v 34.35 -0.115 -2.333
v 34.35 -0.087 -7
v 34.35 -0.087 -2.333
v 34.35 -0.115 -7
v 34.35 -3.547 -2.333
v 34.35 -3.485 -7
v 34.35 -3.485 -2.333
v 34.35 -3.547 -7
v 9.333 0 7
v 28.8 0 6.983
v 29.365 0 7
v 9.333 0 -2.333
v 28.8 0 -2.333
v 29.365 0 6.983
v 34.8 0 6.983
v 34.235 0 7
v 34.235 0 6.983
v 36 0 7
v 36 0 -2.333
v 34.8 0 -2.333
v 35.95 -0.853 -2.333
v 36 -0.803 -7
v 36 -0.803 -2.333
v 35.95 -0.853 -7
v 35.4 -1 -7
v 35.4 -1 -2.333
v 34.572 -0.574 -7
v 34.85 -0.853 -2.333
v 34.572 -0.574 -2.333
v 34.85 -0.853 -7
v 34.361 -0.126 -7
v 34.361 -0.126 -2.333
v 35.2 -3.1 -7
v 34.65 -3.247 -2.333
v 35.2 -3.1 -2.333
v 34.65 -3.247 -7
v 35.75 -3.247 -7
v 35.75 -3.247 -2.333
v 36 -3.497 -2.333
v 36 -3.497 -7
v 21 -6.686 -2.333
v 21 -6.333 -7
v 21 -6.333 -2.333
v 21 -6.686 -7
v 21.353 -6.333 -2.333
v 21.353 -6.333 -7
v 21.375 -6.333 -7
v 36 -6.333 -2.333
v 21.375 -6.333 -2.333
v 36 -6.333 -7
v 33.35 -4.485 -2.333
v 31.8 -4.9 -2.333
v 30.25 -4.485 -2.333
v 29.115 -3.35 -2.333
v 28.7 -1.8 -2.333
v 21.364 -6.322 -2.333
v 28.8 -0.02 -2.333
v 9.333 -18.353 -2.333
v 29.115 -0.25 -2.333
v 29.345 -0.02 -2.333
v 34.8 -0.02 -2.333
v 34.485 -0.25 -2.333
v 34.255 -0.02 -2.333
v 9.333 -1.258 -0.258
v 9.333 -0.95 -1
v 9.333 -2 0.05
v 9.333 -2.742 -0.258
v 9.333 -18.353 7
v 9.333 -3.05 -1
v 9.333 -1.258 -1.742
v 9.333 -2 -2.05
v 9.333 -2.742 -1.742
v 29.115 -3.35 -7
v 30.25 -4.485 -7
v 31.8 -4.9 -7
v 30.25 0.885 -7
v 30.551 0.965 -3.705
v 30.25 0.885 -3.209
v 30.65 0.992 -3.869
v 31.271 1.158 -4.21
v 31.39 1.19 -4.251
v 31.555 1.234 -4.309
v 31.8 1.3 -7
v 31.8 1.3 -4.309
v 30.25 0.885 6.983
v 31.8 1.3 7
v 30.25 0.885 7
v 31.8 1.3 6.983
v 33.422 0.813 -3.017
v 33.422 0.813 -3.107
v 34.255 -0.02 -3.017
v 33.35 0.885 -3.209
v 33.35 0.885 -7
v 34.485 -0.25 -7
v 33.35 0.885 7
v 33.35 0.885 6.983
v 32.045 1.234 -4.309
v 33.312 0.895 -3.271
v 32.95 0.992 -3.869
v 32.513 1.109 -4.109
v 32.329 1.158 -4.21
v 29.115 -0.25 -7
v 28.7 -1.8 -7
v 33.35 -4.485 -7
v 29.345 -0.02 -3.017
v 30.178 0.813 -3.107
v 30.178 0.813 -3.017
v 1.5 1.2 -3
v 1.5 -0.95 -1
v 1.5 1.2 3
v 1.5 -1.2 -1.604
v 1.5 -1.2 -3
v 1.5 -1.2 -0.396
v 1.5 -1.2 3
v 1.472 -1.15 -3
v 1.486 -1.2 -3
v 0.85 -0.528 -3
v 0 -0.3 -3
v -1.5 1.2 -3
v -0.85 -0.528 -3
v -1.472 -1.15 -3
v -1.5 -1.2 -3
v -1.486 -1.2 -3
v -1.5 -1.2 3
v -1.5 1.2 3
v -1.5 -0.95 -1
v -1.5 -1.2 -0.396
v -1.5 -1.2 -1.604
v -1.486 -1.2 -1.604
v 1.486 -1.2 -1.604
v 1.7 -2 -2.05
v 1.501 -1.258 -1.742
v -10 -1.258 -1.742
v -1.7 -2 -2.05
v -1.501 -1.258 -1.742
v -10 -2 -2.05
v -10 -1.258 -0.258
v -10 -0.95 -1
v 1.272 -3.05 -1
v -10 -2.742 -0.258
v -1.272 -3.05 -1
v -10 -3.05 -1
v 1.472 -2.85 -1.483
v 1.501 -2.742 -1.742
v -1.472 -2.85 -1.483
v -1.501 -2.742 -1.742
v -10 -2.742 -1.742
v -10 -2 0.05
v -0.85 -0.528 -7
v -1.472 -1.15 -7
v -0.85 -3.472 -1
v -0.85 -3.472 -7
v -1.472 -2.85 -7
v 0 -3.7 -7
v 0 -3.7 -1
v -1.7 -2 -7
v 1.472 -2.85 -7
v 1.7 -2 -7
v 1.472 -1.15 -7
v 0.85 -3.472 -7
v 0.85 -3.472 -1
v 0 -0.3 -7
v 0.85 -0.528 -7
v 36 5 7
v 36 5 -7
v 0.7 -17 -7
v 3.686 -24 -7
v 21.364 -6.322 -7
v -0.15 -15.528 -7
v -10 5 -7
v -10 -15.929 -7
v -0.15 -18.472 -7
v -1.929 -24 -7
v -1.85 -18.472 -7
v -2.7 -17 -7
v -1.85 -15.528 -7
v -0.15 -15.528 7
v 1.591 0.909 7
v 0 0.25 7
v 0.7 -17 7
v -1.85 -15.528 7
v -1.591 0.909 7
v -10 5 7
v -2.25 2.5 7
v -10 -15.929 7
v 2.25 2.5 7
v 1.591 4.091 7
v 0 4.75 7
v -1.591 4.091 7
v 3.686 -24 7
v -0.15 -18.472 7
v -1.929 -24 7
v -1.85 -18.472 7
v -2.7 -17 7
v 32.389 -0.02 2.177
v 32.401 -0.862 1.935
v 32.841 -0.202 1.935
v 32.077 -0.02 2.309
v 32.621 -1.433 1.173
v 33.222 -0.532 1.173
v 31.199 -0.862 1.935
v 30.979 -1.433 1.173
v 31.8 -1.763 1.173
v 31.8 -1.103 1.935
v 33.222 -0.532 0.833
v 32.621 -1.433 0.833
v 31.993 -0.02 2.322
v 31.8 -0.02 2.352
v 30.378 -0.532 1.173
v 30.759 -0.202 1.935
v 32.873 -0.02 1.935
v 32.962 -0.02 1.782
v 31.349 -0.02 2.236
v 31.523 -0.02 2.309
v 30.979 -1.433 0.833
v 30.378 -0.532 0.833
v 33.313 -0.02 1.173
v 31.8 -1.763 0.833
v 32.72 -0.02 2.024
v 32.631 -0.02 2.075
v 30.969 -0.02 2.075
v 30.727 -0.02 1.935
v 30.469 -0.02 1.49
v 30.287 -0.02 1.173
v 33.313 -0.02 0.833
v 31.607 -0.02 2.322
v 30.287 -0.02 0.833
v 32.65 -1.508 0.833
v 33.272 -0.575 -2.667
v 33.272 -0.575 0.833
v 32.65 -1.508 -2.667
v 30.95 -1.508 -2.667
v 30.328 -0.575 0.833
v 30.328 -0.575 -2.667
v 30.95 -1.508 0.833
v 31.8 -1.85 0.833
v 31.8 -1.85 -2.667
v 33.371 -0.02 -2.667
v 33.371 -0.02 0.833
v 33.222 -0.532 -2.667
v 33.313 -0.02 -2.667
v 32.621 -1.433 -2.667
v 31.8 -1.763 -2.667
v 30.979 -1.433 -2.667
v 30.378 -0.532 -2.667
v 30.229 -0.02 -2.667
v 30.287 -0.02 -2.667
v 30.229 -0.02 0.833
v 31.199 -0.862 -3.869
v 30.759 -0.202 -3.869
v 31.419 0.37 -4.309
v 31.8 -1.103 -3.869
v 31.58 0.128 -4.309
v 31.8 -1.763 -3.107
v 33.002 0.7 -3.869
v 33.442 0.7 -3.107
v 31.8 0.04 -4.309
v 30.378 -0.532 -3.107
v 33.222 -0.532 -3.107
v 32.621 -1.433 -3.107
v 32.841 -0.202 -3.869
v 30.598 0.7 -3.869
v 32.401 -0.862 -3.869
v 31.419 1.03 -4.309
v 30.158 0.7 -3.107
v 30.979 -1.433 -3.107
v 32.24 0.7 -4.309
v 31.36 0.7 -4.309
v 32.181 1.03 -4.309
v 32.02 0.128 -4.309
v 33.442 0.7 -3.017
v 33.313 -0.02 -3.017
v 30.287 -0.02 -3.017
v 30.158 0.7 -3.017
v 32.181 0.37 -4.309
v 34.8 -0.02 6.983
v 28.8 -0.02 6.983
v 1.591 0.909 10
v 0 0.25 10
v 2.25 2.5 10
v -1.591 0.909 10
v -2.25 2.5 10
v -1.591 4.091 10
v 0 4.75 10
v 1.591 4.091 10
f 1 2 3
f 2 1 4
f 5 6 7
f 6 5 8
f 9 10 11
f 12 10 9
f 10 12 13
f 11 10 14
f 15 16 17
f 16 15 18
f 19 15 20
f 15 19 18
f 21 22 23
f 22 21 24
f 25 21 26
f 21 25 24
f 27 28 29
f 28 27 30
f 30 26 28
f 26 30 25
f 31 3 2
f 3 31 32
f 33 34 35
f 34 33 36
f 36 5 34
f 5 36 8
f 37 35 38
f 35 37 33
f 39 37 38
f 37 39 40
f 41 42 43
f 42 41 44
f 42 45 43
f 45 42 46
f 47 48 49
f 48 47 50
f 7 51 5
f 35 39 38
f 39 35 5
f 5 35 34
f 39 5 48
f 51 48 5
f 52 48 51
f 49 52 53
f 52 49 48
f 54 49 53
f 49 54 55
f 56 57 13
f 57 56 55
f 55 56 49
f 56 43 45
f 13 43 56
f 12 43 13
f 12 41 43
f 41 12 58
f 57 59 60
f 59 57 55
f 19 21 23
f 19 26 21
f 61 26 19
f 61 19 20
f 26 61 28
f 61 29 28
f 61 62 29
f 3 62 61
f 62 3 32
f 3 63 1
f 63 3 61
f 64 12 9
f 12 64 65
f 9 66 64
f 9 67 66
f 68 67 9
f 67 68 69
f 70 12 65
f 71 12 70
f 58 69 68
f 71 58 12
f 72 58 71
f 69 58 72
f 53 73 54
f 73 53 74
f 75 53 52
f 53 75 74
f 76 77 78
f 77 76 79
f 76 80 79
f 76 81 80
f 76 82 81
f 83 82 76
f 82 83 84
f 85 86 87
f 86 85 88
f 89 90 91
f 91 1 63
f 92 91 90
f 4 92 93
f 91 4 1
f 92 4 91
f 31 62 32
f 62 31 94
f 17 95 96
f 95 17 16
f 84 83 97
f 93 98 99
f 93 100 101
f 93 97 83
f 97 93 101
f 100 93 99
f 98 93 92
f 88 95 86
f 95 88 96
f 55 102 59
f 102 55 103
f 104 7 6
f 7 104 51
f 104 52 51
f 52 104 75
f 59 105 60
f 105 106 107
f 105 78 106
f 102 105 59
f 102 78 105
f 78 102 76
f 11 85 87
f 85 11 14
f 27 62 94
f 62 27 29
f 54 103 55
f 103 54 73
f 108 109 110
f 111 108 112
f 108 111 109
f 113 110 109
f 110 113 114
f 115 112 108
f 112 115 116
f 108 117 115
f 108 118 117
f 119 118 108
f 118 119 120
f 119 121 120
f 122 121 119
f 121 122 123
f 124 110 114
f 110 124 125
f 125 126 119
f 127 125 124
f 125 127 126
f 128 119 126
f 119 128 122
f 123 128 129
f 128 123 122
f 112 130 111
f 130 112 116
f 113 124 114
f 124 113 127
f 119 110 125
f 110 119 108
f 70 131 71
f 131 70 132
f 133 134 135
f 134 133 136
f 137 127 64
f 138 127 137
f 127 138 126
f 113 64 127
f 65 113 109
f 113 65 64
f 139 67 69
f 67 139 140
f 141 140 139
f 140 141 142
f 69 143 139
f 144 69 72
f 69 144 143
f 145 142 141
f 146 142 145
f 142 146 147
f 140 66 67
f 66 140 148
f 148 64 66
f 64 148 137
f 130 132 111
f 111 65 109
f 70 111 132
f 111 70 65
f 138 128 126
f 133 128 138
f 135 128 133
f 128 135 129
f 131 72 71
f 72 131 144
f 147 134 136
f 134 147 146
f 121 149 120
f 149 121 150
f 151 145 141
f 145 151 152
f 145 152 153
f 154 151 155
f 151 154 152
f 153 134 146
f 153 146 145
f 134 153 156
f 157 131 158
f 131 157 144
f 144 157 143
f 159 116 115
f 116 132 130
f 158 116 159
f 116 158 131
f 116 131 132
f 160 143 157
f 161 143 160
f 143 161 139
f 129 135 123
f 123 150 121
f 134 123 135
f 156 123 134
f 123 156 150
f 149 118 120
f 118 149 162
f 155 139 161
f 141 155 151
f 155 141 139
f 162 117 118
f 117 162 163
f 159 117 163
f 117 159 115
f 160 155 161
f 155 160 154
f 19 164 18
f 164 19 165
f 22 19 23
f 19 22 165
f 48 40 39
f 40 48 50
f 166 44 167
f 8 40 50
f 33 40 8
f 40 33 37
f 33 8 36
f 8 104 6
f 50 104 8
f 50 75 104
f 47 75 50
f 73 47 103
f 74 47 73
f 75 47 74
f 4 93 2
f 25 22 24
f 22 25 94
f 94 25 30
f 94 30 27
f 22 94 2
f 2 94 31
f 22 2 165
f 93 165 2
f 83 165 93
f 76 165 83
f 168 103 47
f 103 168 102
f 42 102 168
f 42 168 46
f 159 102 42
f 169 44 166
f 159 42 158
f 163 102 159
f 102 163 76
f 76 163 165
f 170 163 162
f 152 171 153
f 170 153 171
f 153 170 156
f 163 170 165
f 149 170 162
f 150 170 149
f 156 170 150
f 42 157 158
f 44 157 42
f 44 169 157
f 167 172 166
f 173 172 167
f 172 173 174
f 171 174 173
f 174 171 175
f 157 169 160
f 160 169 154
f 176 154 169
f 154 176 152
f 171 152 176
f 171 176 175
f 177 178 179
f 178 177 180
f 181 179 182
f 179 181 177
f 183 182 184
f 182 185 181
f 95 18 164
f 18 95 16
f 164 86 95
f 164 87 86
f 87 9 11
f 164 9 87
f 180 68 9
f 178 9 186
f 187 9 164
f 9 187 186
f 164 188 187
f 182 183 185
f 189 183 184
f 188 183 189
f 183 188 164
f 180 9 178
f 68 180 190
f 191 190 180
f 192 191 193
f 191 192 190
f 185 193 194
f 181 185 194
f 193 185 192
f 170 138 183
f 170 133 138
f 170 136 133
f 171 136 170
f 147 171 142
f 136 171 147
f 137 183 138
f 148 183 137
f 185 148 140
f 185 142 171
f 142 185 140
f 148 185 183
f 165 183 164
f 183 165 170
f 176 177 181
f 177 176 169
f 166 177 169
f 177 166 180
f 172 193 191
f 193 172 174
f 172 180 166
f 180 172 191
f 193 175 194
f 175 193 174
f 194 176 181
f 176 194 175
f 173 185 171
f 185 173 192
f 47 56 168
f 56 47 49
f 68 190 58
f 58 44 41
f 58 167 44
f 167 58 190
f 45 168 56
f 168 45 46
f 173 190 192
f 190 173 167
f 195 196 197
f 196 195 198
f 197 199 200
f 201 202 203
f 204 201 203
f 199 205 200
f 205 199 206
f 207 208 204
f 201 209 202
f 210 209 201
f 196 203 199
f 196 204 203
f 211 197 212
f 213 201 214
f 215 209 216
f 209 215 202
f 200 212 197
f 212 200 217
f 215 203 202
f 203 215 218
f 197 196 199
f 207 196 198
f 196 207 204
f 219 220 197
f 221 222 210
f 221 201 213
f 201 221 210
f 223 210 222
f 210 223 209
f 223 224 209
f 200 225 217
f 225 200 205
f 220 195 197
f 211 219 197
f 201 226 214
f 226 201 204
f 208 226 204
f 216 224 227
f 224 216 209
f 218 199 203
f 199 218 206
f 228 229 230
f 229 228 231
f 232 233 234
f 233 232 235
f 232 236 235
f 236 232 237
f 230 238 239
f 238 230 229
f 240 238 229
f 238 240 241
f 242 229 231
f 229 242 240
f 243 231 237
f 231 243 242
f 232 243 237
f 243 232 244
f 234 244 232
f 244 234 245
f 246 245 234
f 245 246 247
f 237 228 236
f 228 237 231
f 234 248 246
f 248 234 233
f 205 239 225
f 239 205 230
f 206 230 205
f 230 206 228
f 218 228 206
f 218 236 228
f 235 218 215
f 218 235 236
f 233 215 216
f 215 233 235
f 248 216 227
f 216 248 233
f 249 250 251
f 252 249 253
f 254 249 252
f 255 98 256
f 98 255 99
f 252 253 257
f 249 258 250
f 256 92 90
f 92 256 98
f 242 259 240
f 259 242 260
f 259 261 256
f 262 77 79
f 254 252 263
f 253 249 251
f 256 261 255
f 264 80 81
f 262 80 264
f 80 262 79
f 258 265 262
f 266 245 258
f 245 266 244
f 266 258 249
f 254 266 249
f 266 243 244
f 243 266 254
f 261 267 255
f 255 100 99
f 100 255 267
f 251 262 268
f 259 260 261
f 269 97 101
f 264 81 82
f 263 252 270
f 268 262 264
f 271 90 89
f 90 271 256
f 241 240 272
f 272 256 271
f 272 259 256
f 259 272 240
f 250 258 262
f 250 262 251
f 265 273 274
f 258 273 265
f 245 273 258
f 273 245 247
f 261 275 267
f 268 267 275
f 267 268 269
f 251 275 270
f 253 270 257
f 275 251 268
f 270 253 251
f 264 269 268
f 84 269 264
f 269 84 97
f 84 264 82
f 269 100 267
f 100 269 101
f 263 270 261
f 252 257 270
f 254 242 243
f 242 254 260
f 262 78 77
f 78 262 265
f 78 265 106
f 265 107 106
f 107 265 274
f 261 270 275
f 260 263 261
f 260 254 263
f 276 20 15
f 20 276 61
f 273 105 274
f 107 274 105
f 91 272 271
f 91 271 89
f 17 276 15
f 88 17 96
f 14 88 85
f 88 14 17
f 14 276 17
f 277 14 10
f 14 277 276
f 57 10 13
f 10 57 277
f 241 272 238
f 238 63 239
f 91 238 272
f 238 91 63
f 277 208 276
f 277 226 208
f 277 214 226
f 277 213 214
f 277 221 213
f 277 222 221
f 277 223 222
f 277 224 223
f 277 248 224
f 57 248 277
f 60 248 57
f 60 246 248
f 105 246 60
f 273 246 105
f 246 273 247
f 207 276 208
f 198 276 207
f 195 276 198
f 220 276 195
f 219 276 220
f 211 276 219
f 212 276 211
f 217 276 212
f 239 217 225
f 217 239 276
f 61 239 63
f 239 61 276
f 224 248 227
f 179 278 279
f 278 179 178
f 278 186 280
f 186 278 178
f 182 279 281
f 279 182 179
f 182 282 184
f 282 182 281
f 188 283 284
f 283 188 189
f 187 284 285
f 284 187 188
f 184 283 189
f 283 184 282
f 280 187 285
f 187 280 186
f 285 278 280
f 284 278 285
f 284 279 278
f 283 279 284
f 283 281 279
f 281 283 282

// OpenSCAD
nsp = 1.7; // pilot hole for #6 screw
nsh = 4;  // connection screw head recess
hradius = 1.3;

module cavity(len,wid,hgt,t,gauge) {
//corner
	translate([len/2,1+wid/2,-1]) cube([8+len/2,2*wid/3,hgt+4],true);
//slot
	translate([len/3,3+wid/4,-2.5]) cube([len/2-2,6+wid/2,5+hgt/3],true);
//tube hole
	  translate([(len/2)-18.2,t/2-1,-hgt])
      rotate([0,0,90]) 
   cylinder(r=0.3+t/2,h=2*hgt,$fn=12);
// Rounded Tube Slot
   difference() {
	  translate([(len/2)-14.5,2,4.5]) 
                        cube([2.3,4,6],center=true);
	  translate([(len/2)-14.6,-0.1,4.5]) 
                        cylinder(r=1.1,h=6,$fn=12,center=true);
	  translate([(len/2)-14.8,4.2,4.5]) 
                        cylinder(r=1.1,h=6,$fn=12,center=true);
  }                       
  cube([3,2.4,6],center=true);

//wire hole
      translate([-70,2,1])
       rotate([0,90,0]) 
        cylinder(r=gauge/2, h=3*len,$fn=8);

// connection screw pilot hole
	  translate([36-len/2,t/2-1.5,0])
      rotate([0,0,90]) 
        cylinder(r=nsp,h=3+hgt,$fn=12);
	  translate([0,2,1])
      rotate([0,0,90]) 
        cylinder(r=nsp,h=3+hgt,$fn=12);

// electrical wire cavity
		  translate([36-len/2,t/2+26,-3+hgt/3])
      rotate([90,0,0]) 
       cylinder(r=1.5,h=wid+2,$fn=6);
}

module compress(len,wid,hgt,t,gauge) {

   difference() {
		translate([13,11,0]) cube([len/2-4,wid,hgt],true);
		cavity(len,wid,hgt,t,gauge);
     translate([-1,17,0])// hole(nsp, 16);
			cylinder(r=nsp, h=16,center=true);
     translate([-7,26,0])
        rotate([0,0,45])
            cube([24,10,hgt+2],center=true);
     translate([15,24,0])
        rotate([0,0,-45])
            cube([34,16,hgt+2],center=true);
     translate([0,30,0])
            cube([24,12,hgt+2],center=true);
	}

 	translate([(len/2)-18.2,-0.7,hgt/3-5.4])
      rotate([0,0,90]) 
        scale([1.5,1,1]) sphere(r=1.7,$fn=12); 
	translate([(len/2)-18.2,-0.7,hgt/3-5.5])
      rotate([0,0,90]) 
        scale([1.5,1,1]) cylinder(r=1.7,h=hgt/4,$fn=12);

	translate([(len/2)-18.2,-0.7,hgt/3-2])
      rotate([0,0,90]) 
        scale([1.5,1,1]) sphere(r=1.7,$fn=12); 
	translate([(len/2)-18.2,-2.48,hgt/3-6.65])
        cube([6,5,hgt-4],center=true); 
}

module piece() {
alpha = 7;    
   translate([0,-2.5,-7])
			cylinder(r=2.25,h=6,center=true,$fn=8);

    compress(100,32,14,5.6,2.1);	
// gauge was 2.15
}

rotate([180,0,0]) 
    piece();
